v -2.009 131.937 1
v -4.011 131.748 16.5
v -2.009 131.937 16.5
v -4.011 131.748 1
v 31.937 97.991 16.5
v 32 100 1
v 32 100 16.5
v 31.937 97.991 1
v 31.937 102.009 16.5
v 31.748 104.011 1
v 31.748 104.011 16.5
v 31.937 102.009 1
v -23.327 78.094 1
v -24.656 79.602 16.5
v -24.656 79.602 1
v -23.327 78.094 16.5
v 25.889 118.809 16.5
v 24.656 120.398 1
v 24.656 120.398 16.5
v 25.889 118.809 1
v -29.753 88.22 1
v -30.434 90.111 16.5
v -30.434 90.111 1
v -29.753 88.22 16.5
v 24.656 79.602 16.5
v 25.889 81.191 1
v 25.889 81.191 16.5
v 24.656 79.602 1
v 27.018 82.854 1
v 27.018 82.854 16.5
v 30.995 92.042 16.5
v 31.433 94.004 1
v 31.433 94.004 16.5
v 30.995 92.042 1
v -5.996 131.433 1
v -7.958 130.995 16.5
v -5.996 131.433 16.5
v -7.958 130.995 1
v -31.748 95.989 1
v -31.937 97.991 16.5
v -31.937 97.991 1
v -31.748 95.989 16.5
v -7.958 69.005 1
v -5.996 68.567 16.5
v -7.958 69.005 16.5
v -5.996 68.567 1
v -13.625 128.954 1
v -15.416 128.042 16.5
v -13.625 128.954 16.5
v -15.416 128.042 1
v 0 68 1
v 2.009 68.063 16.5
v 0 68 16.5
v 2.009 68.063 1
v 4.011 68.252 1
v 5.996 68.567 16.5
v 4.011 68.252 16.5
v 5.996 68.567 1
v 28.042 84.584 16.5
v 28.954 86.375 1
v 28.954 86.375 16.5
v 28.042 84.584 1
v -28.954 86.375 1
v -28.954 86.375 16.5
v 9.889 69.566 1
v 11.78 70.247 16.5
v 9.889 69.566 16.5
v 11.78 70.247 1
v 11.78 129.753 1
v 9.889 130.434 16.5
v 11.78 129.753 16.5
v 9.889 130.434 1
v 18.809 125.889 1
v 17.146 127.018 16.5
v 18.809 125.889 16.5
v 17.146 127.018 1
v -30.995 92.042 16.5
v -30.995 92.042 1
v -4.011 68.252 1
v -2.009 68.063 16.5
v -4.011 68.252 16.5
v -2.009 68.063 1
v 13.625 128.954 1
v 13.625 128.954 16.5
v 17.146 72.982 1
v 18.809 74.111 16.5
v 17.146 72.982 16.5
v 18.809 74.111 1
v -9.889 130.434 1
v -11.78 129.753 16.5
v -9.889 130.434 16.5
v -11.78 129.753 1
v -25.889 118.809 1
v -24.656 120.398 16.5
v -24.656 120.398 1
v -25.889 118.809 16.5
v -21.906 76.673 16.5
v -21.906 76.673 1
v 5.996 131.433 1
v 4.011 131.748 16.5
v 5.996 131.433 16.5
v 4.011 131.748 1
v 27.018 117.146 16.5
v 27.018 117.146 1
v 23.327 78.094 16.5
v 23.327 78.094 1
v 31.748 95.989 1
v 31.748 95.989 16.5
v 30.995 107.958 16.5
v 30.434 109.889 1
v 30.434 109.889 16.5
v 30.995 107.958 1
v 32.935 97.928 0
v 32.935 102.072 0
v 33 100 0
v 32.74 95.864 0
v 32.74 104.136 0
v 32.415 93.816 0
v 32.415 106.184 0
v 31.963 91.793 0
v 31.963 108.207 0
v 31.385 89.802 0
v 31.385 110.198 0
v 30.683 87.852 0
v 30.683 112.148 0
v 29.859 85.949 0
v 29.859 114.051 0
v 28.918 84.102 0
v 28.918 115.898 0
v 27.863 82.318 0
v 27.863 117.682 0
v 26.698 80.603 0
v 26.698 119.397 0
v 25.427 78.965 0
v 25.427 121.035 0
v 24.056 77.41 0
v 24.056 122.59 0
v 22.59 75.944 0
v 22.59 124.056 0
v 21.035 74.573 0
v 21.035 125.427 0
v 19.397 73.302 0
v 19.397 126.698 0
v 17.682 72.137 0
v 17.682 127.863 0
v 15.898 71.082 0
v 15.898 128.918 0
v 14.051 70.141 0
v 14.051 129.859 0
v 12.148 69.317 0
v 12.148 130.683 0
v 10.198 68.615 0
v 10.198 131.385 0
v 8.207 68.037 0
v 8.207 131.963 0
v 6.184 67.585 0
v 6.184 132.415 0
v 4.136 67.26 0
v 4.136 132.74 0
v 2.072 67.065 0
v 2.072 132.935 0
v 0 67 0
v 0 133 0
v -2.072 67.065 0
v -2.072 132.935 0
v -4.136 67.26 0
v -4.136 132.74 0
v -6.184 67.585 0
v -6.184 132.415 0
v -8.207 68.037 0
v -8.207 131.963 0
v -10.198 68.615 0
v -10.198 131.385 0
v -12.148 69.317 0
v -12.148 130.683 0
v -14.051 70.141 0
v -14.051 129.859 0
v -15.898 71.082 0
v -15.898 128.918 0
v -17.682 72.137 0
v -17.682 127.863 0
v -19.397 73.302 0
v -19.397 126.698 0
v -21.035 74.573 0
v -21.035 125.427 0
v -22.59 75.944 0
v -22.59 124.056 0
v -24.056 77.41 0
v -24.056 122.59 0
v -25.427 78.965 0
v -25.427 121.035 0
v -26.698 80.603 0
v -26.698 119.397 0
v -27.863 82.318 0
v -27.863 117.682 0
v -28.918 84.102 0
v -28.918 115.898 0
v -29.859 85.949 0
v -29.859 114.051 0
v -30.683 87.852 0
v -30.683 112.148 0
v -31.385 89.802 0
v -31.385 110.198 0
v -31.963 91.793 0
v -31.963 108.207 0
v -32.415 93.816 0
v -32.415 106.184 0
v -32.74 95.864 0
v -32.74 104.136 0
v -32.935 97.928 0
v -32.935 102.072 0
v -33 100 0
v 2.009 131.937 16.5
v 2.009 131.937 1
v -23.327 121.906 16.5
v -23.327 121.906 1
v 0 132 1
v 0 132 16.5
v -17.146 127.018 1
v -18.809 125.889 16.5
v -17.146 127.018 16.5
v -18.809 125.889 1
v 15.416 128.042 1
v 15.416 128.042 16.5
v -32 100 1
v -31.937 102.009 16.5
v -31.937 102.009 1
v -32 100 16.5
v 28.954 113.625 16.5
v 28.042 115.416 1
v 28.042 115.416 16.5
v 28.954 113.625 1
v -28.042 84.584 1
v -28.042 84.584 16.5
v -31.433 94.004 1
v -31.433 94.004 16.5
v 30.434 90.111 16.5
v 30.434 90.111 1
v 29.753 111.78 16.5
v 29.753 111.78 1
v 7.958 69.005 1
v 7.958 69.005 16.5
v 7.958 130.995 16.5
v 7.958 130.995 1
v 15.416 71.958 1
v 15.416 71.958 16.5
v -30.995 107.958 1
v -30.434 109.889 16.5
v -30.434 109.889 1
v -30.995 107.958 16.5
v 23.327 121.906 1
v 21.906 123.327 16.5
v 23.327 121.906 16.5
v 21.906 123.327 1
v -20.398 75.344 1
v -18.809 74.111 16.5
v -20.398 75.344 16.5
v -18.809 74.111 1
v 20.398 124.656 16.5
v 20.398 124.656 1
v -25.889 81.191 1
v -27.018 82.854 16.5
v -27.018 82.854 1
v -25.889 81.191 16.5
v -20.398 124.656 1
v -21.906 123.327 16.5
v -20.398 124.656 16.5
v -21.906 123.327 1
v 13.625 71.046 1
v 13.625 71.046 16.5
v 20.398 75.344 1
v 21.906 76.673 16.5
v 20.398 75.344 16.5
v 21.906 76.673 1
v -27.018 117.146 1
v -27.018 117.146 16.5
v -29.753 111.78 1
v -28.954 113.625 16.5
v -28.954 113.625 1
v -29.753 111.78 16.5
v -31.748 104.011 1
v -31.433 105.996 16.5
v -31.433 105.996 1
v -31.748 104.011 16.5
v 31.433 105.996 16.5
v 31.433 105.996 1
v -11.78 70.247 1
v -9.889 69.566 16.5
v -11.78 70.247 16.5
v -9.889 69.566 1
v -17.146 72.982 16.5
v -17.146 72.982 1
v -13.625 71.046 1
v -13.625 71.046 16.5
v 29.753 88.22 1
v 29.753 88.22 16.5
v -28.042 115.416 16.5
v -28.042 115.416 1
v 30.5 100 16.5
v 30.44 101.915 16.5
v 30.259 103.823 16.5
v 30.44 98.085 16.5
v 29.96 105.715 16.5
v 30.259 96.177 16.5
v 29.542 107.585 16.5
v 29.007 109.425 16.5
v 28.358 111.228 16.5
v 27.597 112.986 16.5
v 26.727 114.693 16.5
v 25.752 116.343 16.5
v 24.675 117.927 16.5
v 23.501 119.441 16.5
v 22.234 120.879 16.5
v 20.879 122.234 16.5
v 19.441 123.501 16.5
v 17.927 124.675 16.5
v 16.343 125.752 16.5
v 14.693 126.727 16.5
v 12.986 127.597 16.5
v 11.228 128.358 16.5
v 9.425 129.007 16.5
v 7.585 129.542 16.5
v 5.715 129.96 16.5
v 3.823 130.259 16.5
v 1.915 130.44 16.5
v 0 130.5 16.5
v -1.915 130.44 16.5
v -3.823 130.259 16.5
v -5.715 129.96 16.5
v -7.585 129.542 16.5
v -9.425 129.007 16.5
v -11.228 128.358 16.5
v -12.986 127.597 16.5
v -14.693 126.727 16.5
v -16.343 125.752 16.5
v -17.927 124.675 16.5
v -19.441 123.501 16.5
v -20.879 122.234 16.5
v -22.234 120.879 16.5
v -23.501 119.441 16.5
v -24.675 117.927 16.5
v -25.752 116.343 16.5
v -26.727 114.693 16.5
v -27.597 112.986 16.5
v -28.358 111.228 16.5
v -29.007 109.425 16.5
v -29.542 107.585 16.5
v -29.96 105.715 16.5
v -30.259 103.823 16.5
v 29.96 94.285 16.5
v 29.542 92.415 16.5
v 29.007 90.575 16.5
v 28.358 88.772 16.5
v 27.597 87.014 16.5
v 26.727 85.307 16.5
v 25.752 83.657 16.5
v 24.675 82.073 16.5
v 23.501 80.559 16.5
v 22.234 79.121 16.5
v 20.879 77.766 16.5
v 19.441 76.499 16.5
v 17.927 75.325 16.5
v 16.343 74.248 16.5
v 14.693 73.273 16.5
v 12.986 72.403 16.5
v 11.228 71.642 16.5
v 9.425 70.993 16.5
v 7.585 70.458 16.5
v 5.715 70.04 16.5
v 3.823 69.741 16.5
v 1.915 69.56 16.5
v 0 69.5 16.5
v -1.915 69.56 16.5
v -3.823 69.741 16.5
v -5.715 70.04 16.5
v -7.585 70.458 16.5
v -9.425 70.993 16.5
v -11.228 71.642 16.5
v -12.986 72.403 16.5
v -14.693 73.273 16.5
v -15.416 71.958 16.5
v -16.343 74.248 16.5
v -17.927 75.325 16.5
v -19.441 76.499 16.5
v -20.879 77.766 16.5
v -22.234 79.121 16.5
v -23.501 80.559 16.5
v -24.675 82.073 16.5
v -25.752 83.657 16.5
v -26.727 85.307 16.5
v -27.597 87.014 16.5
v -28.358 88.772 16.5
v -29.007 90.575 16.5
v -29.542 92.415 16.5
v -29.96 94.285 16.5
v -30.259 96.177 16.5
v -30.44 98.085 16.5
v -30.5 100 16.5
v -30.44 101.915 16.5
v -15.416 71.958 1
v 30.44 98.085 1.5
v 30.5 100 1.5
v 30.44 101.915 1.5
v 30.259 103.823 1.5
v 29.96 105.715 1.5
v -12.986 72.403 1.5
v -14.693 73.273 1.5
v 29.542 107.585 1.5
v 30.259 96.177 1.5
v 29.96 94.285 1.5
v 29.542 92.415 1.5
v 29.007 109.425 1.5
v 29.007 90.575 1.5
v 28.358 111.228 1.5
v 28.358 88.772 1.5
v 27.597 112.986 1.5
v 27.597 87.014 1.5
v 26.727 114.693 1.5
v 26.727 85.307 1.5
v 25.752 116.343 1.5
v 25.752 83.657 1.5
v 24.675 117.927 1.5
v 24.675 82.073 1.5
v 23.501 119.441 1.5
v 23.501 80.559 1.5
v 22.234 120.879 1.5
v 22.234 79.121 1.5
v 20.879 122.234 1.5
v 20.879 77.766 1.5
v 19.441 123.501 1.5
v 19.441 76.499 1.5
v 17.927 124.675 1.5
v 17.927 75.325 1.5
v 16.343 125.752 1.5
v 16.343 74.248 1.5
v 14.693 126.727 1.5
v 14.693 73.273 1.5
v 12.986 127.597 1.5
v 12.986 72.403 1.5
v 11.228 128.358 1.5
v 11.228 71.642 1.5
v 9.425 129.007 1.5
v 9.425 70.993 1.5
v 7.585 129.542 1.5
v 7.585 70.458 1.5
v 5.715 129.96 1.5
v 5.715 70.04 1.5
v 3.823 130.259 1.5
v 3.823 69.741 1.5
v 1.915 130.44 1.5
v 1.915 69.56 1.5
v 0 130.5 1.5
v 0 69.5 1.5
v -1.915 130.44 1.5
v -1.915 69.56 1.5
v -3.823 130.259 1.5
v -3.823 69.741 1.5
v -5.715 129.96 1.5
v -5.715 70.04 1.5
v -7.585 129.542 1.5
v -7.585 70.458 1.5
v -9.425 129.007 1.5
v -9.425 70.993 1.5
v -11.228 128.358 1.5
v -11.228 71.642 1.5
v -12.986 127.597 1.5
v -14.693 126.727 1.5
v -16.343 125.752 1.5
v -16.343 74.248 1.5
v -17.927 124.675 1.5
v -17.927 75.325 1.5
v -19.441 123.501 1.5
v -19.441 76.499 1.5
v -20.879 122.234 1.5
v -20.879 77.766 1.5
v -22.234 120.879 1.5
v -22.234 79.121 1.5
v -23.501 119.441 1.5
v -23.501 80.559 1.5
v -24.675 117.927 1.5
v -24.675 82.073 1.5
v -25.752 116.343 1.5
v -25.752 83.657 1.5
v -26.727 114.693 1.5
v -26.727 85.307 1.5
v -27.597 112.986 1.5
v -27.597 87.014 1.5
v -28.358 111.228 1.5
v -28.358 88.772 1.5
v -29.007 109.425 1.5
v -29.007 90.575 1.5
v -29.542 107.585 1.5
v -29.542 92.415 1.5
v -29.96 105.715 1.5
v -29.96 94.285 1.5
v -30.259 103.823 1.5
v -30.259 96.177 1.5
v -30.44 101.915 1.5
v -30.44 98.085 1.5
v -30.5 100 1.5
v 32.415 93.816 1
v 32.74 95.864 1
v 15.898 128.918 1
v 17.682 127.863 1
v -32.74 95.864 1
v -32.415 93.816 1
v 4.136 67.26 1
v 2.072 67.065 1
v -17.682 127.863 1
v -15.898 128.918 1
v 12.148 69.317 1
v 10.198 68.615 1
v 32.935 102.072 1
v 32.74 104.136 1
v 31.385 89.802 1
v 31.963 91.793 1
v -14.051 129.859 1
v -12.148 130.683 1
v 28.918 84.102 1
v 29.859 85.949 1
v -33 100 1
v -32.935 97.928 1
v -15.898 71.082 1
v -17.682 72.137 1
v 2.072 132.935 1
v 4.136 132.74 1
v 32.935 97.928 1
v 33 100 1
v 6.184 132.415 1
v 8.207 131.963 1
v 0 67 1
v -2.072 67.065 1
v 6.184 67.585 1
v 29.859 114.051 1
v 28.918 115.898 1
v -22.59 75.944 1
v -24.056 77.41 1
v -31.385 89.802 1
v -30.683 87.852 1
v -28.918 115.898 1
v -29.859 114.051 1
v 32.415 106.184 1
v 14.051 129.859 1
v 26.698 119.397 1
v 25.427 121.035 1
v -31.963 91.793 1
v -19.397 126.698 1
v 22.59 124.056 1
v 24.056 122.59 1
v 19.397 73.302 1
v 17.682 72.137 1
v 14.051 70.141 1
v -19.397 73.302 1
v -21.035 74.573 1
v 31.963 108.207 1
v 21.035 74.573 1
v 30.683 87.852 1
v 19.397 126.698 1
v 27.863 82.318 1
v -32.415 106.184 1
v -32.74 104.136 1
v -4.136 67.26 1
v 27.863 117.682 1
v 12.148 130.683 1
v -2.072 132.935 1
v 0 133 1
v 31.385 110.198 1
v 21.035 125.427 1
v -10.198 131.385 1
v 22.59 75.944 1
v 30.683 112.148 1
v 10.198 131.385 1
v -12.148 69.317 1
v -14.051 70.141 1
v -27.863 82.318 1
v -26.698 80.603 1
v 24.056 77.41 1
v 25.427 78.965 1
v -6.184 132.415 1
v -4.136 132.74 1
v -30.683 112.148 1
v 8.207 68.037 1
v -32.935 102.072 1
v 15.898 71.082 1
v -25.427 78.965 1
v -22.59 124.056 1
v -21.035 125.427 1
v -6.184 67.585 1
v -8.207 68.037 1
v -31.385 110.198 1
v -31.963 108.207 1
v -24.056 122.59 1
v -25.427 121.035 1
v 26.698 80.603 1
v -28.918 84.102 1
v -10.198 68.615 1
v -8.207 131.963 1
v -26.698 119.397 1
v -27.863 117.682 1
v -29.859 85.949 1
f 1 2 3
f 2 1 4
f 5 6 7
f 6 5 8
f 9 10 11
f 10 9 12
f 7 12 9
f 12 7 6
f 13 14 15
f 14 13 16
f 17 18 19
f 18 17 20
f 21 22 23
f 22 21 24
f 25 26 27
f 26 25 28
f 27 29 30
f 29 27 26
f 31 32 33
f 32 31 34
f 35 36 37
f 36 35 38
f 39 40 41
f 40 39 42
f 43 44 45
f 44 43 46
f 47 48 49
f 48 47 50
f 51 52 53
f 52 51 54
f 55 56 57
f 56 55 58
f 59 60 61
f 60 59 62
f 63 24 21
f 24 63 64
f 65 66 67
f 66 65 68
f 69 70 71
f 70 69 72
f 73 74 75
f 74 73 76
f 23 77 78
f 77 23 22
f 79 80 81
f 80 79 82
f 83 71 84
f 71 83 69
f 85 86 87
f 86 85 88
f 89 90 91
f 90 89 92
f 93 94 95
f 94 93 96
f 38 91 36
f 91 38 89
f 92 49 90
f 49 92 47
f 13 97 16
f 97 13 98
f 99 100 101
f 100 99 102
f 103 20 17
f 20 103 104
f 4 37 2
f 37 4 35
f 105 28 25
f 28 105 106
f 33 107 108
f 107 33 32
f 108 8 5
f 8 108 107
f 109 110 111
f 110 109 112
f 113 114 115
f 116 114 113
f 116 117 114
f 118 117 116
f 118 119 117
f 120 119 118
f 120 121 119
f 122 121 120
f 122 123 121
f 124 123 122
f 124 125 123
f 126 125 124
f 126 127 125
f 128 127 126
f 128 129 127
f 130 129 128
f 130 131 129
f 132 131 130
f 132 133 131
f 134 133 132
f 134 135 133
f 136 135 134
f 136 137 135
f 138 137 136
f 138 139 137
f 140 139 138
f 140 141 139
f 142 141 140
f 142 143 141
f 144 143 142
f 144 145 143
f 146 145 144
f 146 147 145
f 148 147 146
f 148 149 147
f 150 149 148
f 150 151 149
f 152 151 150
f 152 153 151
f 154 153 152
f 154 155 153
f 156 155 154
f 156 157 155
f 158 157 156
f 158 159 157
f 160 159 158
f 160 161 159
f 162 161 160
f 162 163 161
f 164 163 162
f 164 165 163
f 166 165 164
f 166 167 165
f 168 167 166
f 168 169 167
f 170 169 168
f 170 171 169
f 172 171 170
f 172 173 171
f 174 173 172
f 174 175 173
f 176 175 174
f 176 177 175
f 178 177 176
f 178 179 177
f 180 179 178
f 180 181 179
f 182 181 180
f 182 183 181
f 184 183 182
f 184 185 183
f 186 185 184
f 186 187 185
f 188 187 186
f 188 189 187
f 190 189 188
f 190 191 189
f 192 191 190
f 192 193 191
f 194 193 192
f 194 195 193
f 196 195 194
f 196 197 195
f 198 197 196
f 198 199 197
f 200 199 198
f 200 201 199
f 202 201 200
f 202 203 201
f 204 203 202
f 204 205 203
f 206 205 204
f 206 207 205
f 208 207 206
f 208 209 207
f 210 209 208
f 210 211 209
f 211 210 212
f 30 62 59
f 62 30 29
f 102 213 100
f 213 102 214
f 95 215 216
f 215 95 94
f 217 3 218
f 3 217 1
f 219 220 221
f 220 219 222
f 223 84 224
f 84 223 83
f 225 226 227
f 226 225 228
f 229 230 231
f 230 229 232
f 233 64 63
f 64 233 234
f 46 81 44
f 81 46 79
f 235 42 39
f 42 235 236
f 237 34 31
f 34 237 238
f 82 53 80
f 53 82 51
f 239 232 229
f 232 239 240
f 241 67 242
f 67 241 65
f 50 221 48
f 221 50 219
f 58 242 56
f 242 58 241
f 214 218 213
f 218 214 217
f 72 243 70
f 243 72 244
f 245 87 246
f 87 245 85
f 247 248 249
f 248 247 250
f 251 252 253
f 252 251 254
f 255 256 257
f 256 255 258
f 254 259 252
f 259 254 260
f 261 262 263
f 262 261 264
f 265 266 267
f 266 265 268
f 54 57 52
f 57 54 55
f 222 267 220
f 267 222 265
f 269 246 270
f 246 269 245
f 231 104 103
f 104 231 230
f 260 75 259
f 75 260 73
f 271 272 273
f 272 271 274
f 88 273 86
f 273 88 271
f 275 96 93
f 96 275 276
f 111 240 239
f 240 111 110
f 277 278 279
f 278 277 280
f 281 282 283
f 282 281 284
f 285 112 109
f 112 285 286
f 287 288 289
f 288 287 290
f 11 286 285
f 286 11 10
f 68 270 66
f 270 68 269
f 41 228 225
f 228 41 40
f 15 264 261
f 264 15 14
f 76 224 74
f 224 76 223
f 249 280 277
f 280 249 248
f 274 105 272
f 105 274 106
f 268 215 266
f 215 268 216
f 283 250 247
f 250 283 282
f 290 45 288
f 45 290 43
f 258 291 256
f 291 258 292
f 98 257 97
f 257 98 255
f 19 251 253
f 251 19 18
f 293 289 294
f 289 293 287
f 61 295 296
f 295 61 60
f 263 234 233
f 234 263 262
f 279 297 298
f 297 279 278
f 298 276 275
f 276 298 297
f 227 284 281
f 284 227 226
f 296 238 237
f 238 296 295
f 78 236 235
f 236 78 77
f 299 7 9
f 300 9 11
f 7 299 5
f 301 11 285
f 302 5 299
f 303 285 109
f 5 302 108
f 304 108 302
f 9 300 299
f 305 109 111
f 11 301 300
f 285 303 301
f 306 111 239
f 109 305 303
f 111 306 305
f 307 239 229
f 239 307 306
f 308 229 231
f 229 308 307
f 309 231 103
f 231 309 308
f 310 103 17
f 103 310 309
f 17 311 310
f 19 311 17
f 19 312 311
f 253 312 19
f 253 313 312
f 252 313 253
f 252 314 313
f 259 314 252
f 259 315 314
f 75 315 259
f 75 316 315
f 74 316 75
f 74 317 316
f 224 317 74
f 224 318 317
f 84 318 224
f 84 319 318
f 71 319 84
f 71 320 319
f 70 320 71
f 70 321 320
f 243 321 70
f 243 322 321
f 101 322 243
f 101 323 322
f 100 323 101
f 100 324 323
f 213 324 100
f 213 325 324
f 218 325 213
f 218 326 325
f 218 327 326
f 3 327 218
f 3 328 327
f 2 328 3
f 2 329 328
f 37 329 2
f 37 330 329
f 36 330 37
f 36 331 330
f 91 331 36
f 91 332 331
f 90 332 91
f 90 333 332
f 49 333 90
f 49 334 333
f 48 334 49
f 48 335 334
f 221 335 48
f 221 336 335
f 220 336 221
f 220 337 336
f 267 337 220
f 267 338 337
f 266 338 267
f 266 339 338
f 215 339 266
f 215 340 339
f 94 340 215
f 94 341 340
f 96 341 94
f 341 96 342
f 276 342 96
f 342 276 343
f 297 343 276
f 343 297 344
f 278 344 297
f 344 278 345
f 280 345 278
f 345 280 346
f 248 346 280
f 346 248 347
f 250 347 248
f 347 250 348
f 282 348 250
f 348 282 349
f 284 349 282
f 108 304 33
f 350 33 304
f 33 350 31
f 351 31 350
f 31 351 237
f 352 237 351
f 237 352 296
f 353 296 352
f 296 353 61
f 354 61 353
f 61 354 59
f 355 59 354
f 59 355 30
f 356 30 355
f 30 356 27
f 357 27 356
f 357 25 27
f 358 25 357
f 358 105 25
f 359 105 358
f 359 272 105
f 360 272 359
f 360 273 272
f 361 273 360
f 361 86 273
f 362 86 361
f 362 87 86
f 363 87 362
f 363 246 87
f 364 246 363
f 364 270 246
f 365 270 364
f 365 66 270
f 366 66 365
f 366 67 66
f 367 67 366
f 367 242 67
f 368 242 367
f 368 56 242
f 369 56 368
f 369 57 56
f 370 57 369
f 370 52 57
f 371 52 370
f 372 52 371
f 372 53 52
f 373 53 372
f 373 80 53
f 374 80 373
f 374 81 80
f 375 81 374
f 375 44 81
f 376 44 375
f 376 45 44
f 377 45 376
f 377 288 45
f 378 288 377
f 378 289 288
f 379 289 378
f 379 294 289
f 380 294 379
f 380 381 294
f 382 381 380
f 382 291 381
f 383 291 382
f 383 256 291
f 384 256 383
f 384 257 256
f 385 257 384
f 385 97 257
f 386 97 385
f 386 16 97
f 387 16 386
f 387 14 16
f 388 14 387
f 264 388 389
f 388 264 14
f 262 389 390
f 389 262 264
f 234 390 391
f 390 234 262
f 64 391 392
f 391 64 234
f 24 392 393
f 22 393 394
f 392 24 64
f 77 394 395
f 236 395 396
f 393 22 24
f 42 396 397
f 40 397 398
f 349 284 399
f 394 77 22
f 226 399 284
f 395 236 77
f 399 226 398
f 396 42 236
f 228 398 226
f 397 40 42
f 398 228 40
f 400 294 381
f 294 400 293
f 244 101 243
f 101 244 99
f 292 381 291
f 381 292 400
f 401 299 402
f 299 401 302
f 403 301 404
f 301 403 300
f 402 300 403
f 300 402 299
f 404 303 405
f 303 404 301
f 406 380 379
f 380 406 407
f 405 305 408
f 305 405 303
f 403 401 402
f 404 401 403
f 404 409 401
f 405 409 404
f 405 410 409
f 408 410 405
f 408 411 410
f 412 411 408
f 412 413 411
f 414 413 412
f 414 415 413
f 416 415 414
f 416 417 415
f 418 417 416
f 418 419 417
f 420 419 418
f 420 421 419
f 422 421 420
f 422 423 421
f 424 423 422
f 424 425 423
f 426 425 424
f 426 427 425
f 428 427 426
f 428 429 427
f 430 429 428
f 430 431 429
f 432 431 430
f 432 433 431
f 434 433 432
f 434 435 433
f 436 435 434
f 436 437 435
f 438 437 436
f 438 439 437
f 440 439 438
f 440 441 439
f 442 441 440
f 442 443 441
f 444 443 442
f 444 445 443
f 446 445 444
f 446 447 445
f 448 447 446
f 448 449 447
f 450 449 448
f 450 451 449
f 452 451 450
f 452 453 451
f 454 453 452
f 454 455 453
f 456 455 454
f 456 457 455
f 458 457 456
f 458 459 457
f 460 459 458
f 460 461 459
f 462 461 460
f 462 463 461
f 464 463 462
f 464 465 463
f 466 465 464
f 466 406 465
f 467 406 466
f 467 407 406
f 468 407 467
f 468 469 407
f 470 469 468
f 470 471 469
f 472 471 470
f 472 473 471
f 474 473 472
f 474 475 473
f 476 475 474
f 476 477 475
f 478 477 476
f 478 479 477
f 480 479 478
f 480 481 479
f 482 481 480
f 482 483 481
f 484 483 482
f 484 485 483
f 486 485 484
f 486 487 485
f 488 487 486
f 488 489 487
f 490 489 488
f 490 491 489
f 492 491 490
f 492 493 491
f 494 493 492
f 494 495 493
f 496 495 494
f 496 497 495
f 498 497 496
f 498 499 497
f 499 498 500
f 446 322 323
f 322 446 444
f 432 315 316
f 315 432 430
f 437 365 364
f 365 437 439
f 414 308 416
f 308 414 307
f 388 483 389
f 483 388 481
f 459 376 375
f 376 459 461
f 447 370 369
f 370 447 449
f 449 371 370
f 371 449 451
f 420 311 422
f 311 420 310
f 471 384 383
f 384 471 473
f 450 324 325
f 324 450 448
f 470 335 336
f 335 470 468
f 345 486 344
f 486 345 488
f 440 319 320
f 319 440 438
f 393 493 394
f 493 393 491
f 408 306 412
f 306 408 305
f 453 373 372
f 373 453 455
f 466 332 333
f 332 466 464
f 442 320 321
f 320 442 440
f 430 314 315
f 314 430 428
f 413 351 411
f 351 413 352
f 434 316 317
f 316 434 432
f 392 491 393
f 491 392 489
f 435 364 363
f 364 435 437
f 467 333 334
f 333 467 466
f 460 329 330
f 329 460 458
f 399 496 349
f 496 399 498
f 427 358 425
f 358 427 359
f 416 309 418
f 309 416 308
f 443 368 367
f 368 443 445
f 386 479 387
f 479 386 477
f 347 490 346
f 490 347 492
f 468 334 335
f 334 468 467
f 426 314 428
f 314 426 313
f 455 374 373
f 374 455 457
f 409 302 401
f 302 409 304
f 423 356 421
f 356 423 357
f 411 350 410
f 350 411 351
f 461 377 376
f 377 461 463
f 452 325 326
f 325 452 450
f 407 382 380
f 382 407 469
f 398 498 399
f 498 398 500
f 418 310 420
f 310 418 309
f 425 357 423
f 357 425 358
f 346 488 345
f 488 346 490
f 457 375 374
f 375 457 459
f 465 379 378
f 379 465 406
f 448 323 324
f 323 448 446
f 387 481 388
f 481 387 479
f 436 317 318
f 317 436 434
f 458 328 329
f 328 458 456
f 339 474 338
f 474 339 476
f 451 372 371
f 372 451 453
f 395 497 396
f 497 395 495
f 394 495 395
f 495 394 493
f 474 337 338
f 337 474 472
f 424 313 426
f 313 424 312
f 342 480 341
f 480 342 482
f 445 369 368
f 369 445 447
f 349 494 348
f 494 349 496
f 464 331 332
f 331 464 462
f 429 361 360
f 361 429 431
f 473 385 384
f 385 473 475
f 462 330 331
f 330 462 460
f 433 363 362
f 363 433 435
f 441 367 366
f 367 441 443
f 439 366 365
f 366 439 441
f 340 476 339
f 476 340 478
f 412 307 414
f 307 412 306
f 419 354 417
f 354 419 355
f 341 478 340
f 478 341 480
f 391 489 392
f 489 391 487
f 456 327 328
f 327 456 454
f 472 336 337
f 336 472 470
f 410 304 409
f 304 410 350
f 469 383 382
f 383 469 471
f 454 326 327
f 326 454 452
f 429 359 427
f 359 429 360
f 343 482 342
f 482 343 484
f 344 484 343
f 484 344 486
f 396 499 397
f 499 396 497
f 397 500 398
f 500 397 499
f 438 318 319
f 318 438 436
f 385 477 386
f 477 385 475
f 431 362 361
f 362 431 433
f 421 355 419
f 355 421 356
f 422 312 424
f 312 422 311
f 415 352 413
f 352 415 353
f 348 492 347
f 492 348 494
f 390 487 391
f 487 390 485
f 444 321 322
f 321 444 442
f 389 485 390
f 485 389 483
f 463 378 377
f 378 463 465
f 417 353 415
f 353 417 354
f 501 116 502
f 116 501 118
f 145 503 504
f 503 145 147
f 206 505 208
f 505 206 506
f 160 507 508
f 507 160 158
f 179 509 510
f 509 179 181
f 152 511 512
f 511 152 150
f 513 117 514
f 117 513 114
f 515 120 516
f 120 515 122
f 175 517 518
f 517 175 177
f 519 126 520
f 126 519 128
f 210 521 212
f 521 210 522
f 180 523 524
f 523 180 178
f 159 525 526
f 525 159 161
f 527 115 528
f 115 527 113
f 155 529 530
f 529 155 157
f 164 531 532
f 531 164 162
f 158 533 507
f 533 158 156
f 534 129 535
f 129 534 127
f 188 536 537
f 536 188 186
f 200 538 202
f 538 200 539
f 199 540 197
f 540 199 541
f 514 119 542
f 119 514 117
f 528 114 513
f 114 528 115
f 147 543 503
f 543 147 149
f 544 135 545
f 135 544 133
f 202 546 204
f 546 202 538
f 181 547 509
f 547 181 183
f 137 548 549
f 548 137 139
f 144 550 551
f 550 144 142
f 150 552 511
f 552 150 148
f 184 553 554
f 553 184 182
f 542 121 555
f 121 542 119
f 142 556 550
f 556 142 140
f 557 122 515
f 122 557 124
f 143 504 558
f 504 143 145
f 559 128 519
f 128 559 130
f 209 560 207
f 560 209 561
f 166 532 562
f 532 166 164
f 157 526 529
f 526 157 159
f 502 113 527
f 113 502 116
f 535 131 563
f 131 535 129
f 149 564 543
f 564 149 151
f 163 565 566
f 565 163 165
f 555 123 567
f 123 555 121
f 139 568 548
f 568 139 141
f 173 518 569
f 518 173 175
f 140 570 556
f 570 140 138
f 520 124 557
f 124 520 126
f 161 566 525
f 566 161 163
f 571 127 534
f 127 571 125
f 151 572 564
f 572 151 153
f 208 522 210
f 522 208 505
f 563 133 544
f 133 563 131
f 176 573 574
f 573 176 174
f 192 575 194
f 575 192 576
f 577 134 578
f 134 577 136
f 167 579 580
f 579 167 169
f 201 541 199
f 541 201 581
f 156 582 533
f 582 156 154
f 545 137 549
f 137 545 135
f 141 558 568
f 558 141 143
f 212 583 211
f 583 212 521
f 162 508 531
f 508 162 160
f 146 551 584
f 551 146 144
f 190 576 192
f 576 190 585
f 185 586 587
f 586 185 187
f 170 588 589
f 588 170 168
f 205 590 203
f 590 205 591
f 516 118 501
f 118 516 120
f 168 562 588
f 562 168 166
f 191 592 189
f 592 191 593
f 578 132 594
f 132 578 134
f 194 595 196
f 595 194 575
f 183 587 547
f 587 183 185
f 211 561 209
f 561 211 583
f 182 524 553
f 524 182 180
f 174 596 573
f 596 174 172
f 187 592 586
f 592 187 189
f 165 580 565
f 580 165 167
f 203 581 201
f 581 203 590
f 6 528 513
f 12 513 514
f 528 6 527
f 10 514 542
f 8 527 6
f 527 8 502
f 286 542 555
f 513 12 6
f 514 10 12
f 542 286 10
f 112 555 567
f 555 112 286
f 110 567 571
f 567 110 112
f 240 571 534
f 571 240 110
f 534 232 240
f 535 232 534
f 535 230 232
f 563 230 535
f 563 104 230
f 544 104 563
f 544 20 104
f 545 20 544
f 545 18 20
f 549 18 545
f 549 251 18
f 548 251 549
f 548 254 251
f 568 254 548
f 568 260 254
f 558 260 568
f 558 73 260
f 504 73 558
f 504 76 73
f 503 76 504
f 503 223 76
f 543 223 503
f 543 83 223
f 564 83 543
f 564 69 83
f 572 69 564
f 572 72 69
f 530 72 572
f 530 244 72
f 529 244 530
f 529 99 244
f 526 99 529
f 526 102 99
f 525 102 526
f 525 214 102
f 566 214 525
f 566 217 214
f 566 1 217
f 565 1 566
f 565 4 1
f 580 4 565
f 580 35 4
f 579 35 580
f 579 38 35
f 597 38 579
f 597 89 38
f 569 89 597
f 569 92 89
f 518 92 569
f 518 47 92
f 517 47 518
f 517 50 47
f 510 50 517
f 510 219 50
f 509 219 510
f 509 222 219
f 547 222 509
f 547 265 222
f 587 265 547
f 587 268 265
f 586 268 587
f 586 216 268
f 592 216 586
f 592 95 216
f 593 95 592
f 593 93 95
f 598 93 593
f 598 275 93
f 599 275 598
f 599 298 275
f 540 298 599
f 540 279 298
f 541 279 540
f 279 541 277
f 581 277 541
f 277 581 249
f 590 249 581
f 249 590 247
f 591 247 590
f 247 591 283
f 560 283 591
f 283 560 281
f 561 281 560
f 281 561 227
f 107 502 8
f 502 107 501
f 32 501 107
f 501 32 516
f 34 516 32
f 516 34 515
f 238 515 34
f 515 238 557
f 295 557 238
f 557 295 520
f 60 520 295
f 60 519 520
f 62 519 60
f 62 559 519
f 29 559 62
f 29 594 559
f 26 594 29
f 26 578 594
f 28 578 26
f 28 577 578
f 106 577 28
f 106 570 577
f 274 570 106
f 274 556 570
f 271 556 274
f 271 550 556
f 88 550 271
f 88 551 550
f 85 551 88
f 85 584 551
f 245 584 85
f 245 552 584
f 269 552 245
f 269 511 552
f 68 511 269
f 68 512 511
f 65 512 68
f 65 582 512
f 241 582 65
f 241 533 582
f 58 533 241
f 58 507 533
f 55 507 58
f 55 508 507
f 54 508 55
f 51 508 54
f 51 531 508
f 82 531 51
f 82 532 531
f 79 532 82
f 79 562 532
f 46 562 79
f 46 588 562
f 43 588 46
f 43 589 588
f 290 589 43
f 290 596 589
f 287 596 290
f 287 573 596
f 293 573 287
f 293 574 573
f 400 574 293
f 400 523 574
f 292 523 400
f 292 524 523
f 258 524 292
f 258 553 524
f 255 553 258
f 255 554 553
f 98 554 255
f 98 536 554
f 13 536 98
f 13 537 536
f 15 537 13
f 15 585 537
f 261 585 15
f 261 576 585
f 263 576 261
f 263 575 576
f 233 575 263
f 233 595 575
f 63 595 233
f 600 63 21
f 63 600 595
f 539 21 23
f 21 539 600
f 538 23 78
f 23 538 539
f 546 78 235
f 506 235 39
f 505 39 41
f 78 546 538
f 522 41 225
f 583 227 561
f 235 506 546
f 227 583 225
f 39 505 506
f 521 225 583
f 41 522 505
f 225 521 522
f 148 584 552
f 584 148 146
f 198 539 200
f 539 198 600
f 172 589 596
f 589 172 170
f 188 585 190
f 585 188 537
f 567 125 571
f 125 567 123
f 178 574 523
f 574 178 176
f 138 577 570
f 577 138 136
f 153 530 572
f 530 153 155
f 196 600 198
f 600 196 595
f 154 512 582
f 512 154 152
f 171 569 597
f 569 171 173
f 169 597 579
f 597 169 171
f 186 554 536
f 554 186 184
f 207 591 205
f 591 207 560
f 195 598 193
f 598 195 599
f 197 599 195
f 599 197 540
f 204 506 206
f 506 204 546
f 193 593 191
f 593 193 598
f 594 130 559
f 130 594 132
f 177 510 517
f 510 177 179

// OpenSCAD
$fn = 100;
overlap = 1;
wallThickness = 1.5;
inset = 15;
gap = 0.1;

module plug(diameter) {
    difference() {
        translate([0,0,(wallThickness + inset)/2])
        cylinder(h = wallThickness + inset, d = diameter, center = true);
        translate([0,0,wallThickness + (inset + gap)/2])
            cylinder(h = inset + gap, d = diameter - 2*wallThickness, center = true);
    }
    translate([0,0,overlap/2])
        cylinder(h = overlap, d = diameter + 2 * overlap,
            center = true);
}

//plug(76);
//translate([100, 0, 0])
//    plug(64);
translate([0, 100, 0])
    plug(64);
